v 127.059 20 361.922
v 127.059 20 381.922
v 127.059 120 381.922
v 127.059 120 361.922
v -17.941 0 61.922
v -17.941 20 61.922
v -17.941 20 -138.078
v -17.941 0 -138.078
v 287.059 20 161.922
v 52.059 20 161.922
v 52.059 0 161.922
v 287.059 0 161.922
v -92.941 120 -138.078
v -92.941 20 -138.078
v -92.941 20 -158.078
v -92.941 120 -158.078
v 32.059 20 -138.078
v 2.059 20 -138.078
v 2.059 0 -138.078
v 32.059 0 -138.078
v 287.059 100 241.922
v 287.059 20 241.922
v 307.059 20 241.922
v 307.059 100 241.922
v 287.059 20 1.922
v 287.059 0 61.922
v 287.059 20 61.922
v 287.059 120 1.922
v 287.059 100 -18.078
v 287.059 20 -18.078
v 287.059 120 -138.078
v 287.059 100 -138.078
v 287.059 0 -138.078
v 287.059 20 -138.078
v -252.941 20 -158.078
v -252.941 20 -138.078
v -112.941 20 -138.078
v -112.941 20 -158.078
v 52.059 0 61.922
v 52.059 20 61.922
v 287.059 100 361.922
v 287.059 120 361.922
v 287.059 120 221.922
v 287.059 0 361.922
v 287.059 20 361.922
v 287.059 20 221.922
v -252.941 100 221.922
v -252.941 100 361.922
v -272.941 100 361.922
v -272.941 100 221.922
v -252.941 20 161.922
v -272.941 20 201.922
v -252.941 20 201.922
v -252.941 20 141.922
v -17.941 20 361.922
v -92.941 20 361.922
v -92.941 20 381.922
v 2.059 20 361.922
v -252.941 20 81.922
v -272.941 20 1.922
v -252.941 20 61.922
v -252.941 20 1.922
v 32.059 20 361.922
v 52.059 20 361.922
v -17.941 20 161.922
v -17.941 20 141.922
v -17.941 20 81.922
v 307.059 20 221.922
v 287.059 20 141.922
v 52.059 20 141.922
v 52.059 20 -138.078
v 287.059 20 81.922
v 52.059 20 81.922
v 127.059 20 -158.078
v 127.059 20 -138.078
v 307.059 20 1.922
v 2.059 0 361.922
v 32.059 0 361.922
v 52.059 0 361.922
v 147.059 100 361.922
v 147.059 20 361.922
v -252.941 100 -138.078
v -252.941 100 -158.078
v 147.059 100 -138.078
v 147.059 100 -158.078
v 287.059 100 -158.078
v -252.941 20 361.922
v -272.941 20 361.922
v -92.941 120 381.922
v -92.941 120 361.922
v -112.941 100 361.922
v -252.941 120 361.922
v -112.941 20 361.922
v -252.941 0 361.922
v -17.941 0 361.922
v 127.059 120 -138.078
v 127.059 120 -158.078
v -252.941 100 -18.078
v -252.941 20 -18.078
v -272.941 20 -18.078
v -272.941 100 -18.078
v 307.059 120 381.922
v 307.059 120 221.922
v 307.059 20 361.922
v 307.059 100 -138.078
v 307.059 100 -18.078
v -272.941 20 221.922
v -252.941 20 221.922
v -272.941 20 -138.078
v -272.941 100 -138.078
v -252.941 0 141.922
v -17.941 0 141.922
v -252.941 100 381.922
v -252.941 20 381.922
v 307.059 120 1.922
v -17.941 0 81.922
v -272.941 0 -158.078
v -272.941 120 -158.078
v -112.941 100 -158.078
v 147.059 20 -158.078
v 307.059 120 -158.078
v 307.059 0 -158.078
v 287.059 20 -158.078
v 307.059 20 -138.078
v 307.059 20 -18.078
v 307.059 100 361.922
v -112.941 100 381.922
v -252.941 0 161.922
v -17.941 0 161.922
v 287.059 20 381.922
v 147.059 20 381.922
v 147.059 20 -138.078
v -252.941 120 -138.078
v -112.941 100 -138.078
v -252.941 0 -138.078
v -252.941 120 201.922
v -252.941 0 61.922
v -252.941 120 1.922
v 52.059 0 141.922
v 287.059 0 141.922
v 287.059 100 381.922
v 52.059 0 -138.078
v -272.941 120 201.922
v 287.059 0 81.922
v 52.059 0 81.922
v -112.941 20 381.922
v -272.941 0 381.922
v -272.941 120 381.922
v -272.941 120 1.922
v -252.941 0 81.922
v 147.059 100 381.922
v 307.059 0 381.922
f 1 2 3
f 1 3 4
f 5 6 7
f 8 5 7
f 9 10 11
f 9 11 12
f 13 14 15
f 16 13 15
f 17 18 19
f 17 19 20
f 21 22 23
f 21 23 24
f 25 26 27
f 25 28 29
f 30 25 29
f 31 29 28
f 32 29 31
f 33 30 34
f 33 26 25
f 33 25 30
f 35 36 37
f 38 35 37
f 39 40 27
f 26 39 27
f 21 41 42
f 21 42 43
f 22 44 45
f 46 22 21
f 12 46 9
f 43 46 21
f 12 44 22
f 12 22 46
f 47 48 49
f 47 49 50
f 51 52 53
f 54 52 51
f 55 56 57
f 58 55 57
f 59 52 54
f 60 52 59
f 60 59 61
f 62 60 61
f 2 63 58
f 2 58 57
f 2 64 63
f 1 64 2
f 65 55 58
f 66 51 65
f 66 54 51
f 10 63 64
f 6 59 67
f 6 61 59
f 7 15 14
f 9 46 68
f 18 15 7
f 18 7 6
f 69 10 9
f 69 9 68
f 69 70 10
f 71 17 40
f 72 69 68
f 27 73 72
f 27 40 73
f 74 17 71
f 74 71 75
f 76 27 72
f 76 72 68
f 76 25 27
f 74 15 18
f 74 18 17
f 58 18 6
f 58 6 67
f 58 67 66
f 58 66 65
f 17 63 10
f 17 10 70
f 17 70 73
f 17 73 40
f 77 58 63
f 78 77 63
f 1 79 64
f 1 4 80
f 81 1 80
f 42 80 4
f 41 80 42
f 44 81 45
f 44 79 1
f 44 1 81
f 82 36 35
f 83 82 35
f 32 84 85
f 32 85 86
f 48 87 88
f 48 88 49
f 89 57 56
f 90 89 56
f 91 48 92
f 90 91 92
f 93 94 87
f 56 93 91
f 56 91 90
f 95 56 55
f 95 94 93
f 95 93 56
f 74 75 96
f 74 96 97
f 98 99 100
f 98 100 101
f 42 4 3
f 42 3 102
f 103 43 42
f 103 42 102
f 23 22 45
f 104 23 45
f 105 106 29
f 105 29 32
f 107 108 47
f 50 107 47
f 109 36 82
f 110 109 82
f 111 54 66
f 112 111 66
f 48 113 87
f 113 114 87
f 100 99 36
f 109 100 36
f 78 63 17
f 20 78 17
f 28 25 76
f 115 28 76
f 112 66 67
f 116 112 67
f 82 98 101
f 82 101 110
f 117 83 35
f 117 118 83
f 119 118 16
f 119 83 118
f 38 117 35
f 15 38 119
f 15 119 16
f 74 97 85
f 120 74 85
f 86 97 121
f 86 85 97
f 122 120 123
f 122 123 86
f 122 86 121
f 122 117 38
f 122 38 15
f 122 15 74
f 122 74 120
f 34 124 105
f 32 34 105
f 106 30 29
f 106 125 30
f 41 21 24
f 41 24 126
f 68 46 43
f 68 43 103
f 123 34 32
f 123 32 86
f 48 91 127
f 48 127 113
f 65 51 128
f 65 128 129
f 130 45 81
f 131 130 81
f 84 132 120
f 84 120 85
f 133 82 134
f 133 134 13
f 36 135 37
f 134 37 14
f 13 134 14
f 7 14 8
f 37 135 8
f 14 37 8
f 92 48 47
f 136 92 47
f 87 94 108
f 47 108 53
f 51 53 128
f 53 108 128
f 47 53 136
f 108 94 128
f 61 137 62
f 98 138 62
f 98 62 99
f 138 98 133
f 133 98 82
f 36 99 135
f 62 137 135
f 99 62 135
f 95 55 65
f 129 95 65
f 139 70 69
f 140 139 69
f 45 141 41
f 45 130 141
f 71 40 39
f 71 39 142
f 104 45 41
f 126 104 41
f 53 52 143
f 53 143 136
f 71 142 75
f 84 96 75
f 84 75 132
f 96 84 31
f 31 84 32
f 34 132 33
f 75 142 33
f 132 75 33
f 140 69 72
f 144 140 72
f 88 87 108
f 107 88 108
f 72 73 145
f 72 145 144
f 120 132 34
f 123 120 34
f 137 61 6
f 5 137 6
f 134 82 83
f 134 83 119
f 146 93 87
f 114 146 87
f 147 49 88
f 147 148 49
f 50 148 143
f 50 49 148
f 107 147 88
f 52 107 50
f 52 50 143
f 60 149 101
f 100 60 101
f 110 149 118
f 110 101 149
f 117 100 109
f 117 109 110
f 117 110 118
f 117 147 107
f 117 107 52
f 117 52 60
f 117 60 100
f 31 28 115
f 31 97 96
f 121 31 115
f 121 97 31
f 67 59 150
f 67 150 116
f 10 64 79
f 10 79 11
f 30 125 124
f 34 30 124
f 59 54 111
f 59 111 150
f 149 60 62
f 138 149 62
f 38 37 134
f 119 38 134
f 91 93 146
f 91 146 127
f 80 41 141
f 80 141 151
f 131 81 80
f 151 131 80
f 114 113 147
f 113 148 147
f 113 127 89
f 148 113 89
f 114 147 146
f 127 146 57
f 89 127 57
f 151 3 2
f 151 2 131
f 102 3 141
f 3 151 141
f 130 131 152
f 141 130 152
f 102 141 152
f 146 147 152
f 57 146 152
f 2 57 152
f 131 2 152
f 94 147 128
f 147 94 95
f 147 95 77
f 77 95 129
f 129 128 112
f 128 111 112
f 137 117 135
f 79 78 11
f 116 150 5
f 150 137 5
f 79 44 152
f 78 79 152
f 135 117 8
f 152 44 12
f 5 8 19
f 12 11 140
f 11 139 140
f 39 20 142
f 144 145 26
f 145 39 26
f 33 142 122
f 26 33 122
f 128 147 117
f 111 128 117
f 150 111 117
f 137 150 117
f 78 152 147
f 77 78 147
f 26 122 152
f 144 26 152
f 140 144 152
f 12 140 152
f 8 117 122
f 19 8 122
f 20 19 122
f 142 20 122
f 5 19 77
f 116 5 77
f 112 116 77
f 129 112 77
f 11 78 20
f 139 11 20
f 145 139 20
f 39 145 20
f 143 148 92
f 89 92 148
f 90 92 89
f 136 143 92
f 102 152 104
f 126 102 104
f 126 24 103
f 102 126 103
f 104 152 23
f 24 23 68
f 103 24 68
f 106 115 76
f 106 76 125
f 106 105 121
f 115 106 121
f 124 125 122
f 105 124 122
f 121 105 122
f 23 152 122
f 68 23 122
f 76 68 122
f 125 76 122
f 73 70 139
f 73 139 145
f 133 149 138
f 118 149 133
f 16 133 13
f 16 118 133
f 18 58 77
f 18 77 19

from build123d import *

# Parameters (mm, degrees)
SKETCH_2_W           = 580
SKETCH_2_H           = 540
EXTRUDE_1_DEPTH      = 20
SKETCH_3_W           = 235
SKETCH_3_H           = 200
CUT_EXTRUDE_1_DEPTH  = 21
SKETCH_4_W           = 235
SKETCH_4_H           = 200
CUT_EXTRUDE_2_DEPTH  = 21
SKETCH_5_W           = 235
SKETCH_5_H           = 200
CUT_EXTRUDE_3_DEPTH  = 21
SKETCH_6_W           = 235
SKETCH_6_H           = 200
CUT_EXTRUDE_4_DEPTH  = 21
SKETCH_7_W           = 30
SKETCH_7_H           = 500
CUT_EXTRUDE_5_DEPTH  = 21
SKETCH_8_W           = 235
SKETCH_8_H           = 60
CUT_EXTRUDE_6_DEPTH  = 21
SKETCH_9_W           = 235
SKETCH_9_H           = 60
CUT_EXTRUDE_7_DEPTH  = 21
SKETCH_10_W          = 180
SKETCH_10_H          = 20
EXTRUDE_2_DEPTH      = 100
SKETCH_11_W          = 140
SKETCH_11_H          = 80
CUT_EXTRUDE_8_DEPTH  = 21
SKETCH_12_W          = 20
SKETCH_12_H          = 140
EXTRUDE_3_DEPTH      = 100
SKETCH_13_W          = 120
SKETCH_13_H          = 80
CUT_EXTRUDE_9_DEPTH  = 21
SKETCH_14_W          = 180
SKETCH_14_H          = 20
EXTRUDE_4_DEPTH      = 100
SKETCH_15_W          = 140
SKETCH_15_H          = 80
CUT_EXTRUDE_10_DEPTH = 21
SKETCH_17_W          = 20
SKETCH_17_H          = 160
EXTRUDE_5_DEPTH      = 100
SKETCH_18_W          = 140
SKETCH_18_H          = 80
CUT_EXTRUDE_11_DEPTH = 21
SKETCH_19_W          = 180
SKETCH_19_H          = 20
EXTRUDE_6_DEPTH      = 100
SKETCH_20_W          = 140
SKETCH_20_H          = 80
CUT_EXTRUDE_12_DEPTH = 21
SKETCH_22_W          = 20
SKETCH_22_H          = 140
EXTRUDE_7_DEPTH      = 100
SKETCH_23_W          = 120
SKETCH_23_H          = 80
CUT_EXTRUDE_13_DEPTH = 581
SKETCH_24_W          = 180
SKETCH_24_H          = 20
EXTRUDE_8_DEPTH      = 100
SKETCH_25_W          = 140
SKETCH_25_H          = 80
CUT_EXTRUDE_14_DEPTH = 100
SKETCH_26_W          = 20
SKETCH_26_H          = 140
EXTRUDE_9_DEPTH      = 100
SKETCH_27_W          = 120
SKETCH_27_H          = 80
CUT_EXTRUDE_15_DEPTH = 100


with BuildPart() as part:
    # 草图2 → 凸台-拉伸1 (new body)
    with BuildSketch(Plane(origin=(0, 0, 0), x_dir=(1, 0, 0), z_dir=(0, 1, 0))):
        with Locations((17.058823529, -111.921568627)):
            Rectangle(SKETCH_2_W, SKETCH_2_H)
    extrude(amount=EXTRUDE_1_DEPTH)

    # 草图3 → 切除-拉伸1 (cut, through all)
    with BuildSketch(Plane(origin=(0, 20, 0), x_dir=(1, 0, 0), z_dir=(0, 1, 0))):
        with Locations((-135.441176471, 38.078431373)):
            Rectangle(SKETCH_3_W, SKETCH_3_H)
    extrude(amount=-CUT_EXTRUDE_1_DEPTH, mode=Mode.SUBTRACT)

    # 草图4 → 切除-拉伸2 (cut, through all)
    with BuildSketch(Plane(origin=(0, 20, 0), x_dir=(1, 0, 0), z_dir=(0, 1, 0))):
        with Locations((169.558823529, 38.078431373)):
            Rectangle(SKETCH_4_W, SKETCH_4_H)
    extrude(amount=-CUT_EXTRUDE_2_DEPTH, mode=Mode.SUBTRACT)

    # 草图5 → 切除-拉伸3 (cut, through all)
    with BuildSketch(Plane(origin=(0, 20, 0), x_dir=(1, 0, 0), z_dir=(0, 1, 0))):
        with Locations((-135.441176471, -261.921568627)):
            Rectangle(SKETCH_5_W, SKETCH_5_H)
    extrude(amount=-CUT_EXTRUDE_3_DEPTH, mode=Mode.SUBTRACT)

    # 草图6 → 切除-拉伸4 (cut, through all)
    with BuildSketch(Plane(origin=(0, 20, 0), x_dir=(1, 0, 0), z_dir=(0, 1, 0))):
        with Locations((169.558823529, -261.921568627)):
            Rectangle(SKETCH_6_W, SKETCH_6_H)
    extrude(amount=-CUT_EXTRUDE_4_DEPTH, mode=Mode.SUBTRACT)

    # 草图7 → 切除-拉伸5 (cut, through all)
    with BuildSketch(Plane(origin=(0, 20, 0), x_dir=(1, 0, 0), z_dir=(0, 1, 0))):
        with Locations((17.058823529, -111.921568627)):
            Rectangle(SKETCH_7_W, SKETCH_7_H)
    extrude(amount=-CUT_EXTRUDE_5_DEPTH, mode=Mode.SUBTRACT)

    # 草图8 → 切除-拉伸6 (cut, through all)
    with BuildSketch(Plane(origin=(0, 20, 0), x_dir=(1, 0, 0), z_dir=(0, 1, 0))):
        with Locations((-135.441176471, -111.921568627)):
            Rectangle(SKETCH_8_W, SKETCH_8_H)
    extrude(amount=-CUT_EXTRUDE_6_DEPTH, mode=Mode.SUBTRACT)

    # 草图9 → 切除-拉伸7 (cut, through all)
    with BuildSketch(Plane(origin=(0, 20, 0), x_dir=(1, 0, 0), z_dir=(0, 1, 0))):
        with Locations((169.558823529, -111.921568627)):
            Rectangle(SKETCH_9_W, SKETCH_9_H)
    extrude(amount=-CUT_EXTRUDE_7_DEPTH, mode=Mode.SUBTRACT)

    # 草图10 → 凸台-拉伸2 (add)
    with BuildSketch(Plane(origin=(0, 20, 0), x_dir=(1, 0, 0), z_dir=(0, 1, 0))):
        with Locations((-182.941176471, 148.078431373)):
            Rectangle(SKETCH_10_W, SKETCH_10_H)
    extrude(amount=EXTRUDE_2_DEPTH)

    # 草图11 → 切除-拉伸8 (cut, through all)
    with BuildSketch(Plane.XY.offset(-138.078431373)):
        with Locations((-182.941176471, 60)):
            Rectangle(SKETCH_11_W, SKETCH_11_H)
    extrude(amount=-CUT_EXTRUDE_8_DEPTH, mode=Mode.SUBTRACT)

    # 草图12 → 凸台-拉伸3 (add)
    with BuildSketch(Plane(origin=(0, 20, 0), x_dir=(1, 0, 0), z_dir=(0, 1, 0))):
        with Locations((-262.941176471, 68.078431373)):
            Rectangle(SKETCH_12_W, SKETCH_12_H)
    extrude(amount=EXTRUDE_3_DEPTH)

    # 草图13 → 切除-拉伸9 (cut, through all)
    with BuildSketch(Plane(origin=(-252.941176471, 0, 0), x_dir=(0, 0, -1), z_dir=(1, 0, 0))):
        with Locations((78.078431373, 60)):
            Rectangle(SKETCH_13_W, SKETCH_13_H)
    extrude(amount=-CUT_EXTRUDE_9_DEPTH, mode=Mode.SUBTRACT)

    # 草图14 → 凸台-拉伸4 (add)
    with BuildSketch(Plane(origin=(0, 20, 0), x_dir=(1, 0, 0), z_dir=(0, 1, 0))):
        with Locations((-182.941176471, -371.921568627)):
            Rectangle(SKETCH_14_W, SKETCH_14_H)
    extrude(amount=EXTRUDE_4_DEPTH)

    # 草图15 → 切除-拉伸10 (cut, through all)
    with BuildSketch(Plane(origin=(0, 0, 361.921568627), x_dir=(-1, 0, 0), z_dir=(0, 0, -1))):
        with Locations((182.941176471, 60)):
            Rectangle(SKETCH_15_W, SKETCH_15_H)
    extrude(amount=-CUT_EXTRUDE_10_DEPTH, mode=Mode.SUBTRACT)

    # 草图17 → 凸台-拉伸5 (add)
    with BuildSketch(Plane(origin=(0, 20, 0), x_dir=(1, 0, 0), z_dir=(0, 1, 0))):
        with Locations((-262.941176471, -281.921568627)):
            Rectangle(SKETCH_17_W, SKETCH_17_H)
    extrude(amount=EXTRUDE_5_DEPTH)

    # 草图18 → 切除-拉伸11 (cut, through all)
    with BuildSketch(Plane(origin=(-252.941176471, 0, 0), x_dir=(0, 0, -1), z_dir=(1, 0, 0))):
        with Locations((-291.921568627, 60)):
            Rectangle(SKETCH_18_W, SKETCH_18_H)
    extrude(amount=-CUT_EXTRUDE_11_DEPTH, mode=Mode.SUBTRACT)

    # 草图19 → 凸台-拉伸6 (add)
    with BuildSketch(Plane(origin=(0, 20, 0), x_dir=(1, 0, 0), z_dir=(0, 1, 0))):
        with Locations((217.058823529, 148.078431373)):
            Rectangle(SKETCH_19_W, SKETCH_19_H)
    extrude(amount=EXTRUDE_6_DEPTH)

    # 草图20 → 切除-拉伸12 (cut, through all)
    with BuildSketch(Plane.XY.offset(-138.078431373)):
        with Locations((217.058823529, 60)):
            Rectangle(SKETCH_20_W, SKETCH_20_H)
    extrude(amount=-CUT_EXTRUDE_12_DEPTH, mode=Mode.SUBTRACT)

    # 草图22 → 凸台-拉伸7 (add)
    with BuildSketch(Plane(origin=(0, 20, 0), x_dir=(1, 0, 0), z_dir=(0, 1, 0))):
        with Locations((297.058823529, 68.078431373)):
            Rectangle(SKETCH_22_W, SKETCH_22_H)
    extrude(amount=EXTRUDE_7_DEPTH)

    # 草图23 → 切除-拉伸13 (cut, through all)
    with BuildSketch(Plane(origin=(307.058823529, 0, 0), x_dir=(0, 0, -1), z_dir=(1, 0, 0))):
        with Locations((78.078431373, 60)):
            Rectangle(SKETCH_23_W, SKETCH_23_H)
    extrude(amount=-CUT_EXTRUDE_13_DEPTH, mode=Mode.SUBTRACT)

    # 草图24 → 凸台-拉伸8 (add)
    with BuildSketch(Plane(origin=(0, 20, 0), x_dir=(1, 0, 0), z_dir=(0, 1, 0))):
        with Locations((217.058823529, -371.921568627)):
            Rectangle(SKETCH_24_W, SKETCH_24_H)
    extrude(amount=EXTRUDE_8_DEPTH)

    # 草图25 → 切除-拉伸14 (cut)
    with BuildSketch(Plane(origin=(0, 0, 361.921568627), x_dir=(-1, 0, 0), z_dir=(0, 0, -1))):
        with Locations((-217.058823529, 60)):
            Rectangle(SKETCH_25_W, SKETCH_25_H)
    extrude(amount=-CUT_EXTRUDE_14_DEPTH, mode=Mode.SUBTRACT)

    # 草图26 → 凸台-拉伸9 (add)
    with BuildSketch(Plane(origin=(0, 20, 0), x_dir=(1, 0, 0), z_dir=(0, 1, 0))):
        with Locations((297.058823529, -291.921568627)):
            Rectangle(SKETCH_26_W, SKETCH_26_H)
    extrude(amount=EXTRUDE_9_DEPTH)

    # 草图27 → 切除-拉伸15 (cut)
    with BuildSketch(Plane.ZY.offset(-287.058823529)):
        with Locations((301.921568627, 60)):
            Rectangle(SKETCH_27_W, SKETCH_27_H)
    extrude(amount=-CUT_EXTRUDE_15_DEPTH, mode=Mode.SUBTRACT)


solid = part.part
